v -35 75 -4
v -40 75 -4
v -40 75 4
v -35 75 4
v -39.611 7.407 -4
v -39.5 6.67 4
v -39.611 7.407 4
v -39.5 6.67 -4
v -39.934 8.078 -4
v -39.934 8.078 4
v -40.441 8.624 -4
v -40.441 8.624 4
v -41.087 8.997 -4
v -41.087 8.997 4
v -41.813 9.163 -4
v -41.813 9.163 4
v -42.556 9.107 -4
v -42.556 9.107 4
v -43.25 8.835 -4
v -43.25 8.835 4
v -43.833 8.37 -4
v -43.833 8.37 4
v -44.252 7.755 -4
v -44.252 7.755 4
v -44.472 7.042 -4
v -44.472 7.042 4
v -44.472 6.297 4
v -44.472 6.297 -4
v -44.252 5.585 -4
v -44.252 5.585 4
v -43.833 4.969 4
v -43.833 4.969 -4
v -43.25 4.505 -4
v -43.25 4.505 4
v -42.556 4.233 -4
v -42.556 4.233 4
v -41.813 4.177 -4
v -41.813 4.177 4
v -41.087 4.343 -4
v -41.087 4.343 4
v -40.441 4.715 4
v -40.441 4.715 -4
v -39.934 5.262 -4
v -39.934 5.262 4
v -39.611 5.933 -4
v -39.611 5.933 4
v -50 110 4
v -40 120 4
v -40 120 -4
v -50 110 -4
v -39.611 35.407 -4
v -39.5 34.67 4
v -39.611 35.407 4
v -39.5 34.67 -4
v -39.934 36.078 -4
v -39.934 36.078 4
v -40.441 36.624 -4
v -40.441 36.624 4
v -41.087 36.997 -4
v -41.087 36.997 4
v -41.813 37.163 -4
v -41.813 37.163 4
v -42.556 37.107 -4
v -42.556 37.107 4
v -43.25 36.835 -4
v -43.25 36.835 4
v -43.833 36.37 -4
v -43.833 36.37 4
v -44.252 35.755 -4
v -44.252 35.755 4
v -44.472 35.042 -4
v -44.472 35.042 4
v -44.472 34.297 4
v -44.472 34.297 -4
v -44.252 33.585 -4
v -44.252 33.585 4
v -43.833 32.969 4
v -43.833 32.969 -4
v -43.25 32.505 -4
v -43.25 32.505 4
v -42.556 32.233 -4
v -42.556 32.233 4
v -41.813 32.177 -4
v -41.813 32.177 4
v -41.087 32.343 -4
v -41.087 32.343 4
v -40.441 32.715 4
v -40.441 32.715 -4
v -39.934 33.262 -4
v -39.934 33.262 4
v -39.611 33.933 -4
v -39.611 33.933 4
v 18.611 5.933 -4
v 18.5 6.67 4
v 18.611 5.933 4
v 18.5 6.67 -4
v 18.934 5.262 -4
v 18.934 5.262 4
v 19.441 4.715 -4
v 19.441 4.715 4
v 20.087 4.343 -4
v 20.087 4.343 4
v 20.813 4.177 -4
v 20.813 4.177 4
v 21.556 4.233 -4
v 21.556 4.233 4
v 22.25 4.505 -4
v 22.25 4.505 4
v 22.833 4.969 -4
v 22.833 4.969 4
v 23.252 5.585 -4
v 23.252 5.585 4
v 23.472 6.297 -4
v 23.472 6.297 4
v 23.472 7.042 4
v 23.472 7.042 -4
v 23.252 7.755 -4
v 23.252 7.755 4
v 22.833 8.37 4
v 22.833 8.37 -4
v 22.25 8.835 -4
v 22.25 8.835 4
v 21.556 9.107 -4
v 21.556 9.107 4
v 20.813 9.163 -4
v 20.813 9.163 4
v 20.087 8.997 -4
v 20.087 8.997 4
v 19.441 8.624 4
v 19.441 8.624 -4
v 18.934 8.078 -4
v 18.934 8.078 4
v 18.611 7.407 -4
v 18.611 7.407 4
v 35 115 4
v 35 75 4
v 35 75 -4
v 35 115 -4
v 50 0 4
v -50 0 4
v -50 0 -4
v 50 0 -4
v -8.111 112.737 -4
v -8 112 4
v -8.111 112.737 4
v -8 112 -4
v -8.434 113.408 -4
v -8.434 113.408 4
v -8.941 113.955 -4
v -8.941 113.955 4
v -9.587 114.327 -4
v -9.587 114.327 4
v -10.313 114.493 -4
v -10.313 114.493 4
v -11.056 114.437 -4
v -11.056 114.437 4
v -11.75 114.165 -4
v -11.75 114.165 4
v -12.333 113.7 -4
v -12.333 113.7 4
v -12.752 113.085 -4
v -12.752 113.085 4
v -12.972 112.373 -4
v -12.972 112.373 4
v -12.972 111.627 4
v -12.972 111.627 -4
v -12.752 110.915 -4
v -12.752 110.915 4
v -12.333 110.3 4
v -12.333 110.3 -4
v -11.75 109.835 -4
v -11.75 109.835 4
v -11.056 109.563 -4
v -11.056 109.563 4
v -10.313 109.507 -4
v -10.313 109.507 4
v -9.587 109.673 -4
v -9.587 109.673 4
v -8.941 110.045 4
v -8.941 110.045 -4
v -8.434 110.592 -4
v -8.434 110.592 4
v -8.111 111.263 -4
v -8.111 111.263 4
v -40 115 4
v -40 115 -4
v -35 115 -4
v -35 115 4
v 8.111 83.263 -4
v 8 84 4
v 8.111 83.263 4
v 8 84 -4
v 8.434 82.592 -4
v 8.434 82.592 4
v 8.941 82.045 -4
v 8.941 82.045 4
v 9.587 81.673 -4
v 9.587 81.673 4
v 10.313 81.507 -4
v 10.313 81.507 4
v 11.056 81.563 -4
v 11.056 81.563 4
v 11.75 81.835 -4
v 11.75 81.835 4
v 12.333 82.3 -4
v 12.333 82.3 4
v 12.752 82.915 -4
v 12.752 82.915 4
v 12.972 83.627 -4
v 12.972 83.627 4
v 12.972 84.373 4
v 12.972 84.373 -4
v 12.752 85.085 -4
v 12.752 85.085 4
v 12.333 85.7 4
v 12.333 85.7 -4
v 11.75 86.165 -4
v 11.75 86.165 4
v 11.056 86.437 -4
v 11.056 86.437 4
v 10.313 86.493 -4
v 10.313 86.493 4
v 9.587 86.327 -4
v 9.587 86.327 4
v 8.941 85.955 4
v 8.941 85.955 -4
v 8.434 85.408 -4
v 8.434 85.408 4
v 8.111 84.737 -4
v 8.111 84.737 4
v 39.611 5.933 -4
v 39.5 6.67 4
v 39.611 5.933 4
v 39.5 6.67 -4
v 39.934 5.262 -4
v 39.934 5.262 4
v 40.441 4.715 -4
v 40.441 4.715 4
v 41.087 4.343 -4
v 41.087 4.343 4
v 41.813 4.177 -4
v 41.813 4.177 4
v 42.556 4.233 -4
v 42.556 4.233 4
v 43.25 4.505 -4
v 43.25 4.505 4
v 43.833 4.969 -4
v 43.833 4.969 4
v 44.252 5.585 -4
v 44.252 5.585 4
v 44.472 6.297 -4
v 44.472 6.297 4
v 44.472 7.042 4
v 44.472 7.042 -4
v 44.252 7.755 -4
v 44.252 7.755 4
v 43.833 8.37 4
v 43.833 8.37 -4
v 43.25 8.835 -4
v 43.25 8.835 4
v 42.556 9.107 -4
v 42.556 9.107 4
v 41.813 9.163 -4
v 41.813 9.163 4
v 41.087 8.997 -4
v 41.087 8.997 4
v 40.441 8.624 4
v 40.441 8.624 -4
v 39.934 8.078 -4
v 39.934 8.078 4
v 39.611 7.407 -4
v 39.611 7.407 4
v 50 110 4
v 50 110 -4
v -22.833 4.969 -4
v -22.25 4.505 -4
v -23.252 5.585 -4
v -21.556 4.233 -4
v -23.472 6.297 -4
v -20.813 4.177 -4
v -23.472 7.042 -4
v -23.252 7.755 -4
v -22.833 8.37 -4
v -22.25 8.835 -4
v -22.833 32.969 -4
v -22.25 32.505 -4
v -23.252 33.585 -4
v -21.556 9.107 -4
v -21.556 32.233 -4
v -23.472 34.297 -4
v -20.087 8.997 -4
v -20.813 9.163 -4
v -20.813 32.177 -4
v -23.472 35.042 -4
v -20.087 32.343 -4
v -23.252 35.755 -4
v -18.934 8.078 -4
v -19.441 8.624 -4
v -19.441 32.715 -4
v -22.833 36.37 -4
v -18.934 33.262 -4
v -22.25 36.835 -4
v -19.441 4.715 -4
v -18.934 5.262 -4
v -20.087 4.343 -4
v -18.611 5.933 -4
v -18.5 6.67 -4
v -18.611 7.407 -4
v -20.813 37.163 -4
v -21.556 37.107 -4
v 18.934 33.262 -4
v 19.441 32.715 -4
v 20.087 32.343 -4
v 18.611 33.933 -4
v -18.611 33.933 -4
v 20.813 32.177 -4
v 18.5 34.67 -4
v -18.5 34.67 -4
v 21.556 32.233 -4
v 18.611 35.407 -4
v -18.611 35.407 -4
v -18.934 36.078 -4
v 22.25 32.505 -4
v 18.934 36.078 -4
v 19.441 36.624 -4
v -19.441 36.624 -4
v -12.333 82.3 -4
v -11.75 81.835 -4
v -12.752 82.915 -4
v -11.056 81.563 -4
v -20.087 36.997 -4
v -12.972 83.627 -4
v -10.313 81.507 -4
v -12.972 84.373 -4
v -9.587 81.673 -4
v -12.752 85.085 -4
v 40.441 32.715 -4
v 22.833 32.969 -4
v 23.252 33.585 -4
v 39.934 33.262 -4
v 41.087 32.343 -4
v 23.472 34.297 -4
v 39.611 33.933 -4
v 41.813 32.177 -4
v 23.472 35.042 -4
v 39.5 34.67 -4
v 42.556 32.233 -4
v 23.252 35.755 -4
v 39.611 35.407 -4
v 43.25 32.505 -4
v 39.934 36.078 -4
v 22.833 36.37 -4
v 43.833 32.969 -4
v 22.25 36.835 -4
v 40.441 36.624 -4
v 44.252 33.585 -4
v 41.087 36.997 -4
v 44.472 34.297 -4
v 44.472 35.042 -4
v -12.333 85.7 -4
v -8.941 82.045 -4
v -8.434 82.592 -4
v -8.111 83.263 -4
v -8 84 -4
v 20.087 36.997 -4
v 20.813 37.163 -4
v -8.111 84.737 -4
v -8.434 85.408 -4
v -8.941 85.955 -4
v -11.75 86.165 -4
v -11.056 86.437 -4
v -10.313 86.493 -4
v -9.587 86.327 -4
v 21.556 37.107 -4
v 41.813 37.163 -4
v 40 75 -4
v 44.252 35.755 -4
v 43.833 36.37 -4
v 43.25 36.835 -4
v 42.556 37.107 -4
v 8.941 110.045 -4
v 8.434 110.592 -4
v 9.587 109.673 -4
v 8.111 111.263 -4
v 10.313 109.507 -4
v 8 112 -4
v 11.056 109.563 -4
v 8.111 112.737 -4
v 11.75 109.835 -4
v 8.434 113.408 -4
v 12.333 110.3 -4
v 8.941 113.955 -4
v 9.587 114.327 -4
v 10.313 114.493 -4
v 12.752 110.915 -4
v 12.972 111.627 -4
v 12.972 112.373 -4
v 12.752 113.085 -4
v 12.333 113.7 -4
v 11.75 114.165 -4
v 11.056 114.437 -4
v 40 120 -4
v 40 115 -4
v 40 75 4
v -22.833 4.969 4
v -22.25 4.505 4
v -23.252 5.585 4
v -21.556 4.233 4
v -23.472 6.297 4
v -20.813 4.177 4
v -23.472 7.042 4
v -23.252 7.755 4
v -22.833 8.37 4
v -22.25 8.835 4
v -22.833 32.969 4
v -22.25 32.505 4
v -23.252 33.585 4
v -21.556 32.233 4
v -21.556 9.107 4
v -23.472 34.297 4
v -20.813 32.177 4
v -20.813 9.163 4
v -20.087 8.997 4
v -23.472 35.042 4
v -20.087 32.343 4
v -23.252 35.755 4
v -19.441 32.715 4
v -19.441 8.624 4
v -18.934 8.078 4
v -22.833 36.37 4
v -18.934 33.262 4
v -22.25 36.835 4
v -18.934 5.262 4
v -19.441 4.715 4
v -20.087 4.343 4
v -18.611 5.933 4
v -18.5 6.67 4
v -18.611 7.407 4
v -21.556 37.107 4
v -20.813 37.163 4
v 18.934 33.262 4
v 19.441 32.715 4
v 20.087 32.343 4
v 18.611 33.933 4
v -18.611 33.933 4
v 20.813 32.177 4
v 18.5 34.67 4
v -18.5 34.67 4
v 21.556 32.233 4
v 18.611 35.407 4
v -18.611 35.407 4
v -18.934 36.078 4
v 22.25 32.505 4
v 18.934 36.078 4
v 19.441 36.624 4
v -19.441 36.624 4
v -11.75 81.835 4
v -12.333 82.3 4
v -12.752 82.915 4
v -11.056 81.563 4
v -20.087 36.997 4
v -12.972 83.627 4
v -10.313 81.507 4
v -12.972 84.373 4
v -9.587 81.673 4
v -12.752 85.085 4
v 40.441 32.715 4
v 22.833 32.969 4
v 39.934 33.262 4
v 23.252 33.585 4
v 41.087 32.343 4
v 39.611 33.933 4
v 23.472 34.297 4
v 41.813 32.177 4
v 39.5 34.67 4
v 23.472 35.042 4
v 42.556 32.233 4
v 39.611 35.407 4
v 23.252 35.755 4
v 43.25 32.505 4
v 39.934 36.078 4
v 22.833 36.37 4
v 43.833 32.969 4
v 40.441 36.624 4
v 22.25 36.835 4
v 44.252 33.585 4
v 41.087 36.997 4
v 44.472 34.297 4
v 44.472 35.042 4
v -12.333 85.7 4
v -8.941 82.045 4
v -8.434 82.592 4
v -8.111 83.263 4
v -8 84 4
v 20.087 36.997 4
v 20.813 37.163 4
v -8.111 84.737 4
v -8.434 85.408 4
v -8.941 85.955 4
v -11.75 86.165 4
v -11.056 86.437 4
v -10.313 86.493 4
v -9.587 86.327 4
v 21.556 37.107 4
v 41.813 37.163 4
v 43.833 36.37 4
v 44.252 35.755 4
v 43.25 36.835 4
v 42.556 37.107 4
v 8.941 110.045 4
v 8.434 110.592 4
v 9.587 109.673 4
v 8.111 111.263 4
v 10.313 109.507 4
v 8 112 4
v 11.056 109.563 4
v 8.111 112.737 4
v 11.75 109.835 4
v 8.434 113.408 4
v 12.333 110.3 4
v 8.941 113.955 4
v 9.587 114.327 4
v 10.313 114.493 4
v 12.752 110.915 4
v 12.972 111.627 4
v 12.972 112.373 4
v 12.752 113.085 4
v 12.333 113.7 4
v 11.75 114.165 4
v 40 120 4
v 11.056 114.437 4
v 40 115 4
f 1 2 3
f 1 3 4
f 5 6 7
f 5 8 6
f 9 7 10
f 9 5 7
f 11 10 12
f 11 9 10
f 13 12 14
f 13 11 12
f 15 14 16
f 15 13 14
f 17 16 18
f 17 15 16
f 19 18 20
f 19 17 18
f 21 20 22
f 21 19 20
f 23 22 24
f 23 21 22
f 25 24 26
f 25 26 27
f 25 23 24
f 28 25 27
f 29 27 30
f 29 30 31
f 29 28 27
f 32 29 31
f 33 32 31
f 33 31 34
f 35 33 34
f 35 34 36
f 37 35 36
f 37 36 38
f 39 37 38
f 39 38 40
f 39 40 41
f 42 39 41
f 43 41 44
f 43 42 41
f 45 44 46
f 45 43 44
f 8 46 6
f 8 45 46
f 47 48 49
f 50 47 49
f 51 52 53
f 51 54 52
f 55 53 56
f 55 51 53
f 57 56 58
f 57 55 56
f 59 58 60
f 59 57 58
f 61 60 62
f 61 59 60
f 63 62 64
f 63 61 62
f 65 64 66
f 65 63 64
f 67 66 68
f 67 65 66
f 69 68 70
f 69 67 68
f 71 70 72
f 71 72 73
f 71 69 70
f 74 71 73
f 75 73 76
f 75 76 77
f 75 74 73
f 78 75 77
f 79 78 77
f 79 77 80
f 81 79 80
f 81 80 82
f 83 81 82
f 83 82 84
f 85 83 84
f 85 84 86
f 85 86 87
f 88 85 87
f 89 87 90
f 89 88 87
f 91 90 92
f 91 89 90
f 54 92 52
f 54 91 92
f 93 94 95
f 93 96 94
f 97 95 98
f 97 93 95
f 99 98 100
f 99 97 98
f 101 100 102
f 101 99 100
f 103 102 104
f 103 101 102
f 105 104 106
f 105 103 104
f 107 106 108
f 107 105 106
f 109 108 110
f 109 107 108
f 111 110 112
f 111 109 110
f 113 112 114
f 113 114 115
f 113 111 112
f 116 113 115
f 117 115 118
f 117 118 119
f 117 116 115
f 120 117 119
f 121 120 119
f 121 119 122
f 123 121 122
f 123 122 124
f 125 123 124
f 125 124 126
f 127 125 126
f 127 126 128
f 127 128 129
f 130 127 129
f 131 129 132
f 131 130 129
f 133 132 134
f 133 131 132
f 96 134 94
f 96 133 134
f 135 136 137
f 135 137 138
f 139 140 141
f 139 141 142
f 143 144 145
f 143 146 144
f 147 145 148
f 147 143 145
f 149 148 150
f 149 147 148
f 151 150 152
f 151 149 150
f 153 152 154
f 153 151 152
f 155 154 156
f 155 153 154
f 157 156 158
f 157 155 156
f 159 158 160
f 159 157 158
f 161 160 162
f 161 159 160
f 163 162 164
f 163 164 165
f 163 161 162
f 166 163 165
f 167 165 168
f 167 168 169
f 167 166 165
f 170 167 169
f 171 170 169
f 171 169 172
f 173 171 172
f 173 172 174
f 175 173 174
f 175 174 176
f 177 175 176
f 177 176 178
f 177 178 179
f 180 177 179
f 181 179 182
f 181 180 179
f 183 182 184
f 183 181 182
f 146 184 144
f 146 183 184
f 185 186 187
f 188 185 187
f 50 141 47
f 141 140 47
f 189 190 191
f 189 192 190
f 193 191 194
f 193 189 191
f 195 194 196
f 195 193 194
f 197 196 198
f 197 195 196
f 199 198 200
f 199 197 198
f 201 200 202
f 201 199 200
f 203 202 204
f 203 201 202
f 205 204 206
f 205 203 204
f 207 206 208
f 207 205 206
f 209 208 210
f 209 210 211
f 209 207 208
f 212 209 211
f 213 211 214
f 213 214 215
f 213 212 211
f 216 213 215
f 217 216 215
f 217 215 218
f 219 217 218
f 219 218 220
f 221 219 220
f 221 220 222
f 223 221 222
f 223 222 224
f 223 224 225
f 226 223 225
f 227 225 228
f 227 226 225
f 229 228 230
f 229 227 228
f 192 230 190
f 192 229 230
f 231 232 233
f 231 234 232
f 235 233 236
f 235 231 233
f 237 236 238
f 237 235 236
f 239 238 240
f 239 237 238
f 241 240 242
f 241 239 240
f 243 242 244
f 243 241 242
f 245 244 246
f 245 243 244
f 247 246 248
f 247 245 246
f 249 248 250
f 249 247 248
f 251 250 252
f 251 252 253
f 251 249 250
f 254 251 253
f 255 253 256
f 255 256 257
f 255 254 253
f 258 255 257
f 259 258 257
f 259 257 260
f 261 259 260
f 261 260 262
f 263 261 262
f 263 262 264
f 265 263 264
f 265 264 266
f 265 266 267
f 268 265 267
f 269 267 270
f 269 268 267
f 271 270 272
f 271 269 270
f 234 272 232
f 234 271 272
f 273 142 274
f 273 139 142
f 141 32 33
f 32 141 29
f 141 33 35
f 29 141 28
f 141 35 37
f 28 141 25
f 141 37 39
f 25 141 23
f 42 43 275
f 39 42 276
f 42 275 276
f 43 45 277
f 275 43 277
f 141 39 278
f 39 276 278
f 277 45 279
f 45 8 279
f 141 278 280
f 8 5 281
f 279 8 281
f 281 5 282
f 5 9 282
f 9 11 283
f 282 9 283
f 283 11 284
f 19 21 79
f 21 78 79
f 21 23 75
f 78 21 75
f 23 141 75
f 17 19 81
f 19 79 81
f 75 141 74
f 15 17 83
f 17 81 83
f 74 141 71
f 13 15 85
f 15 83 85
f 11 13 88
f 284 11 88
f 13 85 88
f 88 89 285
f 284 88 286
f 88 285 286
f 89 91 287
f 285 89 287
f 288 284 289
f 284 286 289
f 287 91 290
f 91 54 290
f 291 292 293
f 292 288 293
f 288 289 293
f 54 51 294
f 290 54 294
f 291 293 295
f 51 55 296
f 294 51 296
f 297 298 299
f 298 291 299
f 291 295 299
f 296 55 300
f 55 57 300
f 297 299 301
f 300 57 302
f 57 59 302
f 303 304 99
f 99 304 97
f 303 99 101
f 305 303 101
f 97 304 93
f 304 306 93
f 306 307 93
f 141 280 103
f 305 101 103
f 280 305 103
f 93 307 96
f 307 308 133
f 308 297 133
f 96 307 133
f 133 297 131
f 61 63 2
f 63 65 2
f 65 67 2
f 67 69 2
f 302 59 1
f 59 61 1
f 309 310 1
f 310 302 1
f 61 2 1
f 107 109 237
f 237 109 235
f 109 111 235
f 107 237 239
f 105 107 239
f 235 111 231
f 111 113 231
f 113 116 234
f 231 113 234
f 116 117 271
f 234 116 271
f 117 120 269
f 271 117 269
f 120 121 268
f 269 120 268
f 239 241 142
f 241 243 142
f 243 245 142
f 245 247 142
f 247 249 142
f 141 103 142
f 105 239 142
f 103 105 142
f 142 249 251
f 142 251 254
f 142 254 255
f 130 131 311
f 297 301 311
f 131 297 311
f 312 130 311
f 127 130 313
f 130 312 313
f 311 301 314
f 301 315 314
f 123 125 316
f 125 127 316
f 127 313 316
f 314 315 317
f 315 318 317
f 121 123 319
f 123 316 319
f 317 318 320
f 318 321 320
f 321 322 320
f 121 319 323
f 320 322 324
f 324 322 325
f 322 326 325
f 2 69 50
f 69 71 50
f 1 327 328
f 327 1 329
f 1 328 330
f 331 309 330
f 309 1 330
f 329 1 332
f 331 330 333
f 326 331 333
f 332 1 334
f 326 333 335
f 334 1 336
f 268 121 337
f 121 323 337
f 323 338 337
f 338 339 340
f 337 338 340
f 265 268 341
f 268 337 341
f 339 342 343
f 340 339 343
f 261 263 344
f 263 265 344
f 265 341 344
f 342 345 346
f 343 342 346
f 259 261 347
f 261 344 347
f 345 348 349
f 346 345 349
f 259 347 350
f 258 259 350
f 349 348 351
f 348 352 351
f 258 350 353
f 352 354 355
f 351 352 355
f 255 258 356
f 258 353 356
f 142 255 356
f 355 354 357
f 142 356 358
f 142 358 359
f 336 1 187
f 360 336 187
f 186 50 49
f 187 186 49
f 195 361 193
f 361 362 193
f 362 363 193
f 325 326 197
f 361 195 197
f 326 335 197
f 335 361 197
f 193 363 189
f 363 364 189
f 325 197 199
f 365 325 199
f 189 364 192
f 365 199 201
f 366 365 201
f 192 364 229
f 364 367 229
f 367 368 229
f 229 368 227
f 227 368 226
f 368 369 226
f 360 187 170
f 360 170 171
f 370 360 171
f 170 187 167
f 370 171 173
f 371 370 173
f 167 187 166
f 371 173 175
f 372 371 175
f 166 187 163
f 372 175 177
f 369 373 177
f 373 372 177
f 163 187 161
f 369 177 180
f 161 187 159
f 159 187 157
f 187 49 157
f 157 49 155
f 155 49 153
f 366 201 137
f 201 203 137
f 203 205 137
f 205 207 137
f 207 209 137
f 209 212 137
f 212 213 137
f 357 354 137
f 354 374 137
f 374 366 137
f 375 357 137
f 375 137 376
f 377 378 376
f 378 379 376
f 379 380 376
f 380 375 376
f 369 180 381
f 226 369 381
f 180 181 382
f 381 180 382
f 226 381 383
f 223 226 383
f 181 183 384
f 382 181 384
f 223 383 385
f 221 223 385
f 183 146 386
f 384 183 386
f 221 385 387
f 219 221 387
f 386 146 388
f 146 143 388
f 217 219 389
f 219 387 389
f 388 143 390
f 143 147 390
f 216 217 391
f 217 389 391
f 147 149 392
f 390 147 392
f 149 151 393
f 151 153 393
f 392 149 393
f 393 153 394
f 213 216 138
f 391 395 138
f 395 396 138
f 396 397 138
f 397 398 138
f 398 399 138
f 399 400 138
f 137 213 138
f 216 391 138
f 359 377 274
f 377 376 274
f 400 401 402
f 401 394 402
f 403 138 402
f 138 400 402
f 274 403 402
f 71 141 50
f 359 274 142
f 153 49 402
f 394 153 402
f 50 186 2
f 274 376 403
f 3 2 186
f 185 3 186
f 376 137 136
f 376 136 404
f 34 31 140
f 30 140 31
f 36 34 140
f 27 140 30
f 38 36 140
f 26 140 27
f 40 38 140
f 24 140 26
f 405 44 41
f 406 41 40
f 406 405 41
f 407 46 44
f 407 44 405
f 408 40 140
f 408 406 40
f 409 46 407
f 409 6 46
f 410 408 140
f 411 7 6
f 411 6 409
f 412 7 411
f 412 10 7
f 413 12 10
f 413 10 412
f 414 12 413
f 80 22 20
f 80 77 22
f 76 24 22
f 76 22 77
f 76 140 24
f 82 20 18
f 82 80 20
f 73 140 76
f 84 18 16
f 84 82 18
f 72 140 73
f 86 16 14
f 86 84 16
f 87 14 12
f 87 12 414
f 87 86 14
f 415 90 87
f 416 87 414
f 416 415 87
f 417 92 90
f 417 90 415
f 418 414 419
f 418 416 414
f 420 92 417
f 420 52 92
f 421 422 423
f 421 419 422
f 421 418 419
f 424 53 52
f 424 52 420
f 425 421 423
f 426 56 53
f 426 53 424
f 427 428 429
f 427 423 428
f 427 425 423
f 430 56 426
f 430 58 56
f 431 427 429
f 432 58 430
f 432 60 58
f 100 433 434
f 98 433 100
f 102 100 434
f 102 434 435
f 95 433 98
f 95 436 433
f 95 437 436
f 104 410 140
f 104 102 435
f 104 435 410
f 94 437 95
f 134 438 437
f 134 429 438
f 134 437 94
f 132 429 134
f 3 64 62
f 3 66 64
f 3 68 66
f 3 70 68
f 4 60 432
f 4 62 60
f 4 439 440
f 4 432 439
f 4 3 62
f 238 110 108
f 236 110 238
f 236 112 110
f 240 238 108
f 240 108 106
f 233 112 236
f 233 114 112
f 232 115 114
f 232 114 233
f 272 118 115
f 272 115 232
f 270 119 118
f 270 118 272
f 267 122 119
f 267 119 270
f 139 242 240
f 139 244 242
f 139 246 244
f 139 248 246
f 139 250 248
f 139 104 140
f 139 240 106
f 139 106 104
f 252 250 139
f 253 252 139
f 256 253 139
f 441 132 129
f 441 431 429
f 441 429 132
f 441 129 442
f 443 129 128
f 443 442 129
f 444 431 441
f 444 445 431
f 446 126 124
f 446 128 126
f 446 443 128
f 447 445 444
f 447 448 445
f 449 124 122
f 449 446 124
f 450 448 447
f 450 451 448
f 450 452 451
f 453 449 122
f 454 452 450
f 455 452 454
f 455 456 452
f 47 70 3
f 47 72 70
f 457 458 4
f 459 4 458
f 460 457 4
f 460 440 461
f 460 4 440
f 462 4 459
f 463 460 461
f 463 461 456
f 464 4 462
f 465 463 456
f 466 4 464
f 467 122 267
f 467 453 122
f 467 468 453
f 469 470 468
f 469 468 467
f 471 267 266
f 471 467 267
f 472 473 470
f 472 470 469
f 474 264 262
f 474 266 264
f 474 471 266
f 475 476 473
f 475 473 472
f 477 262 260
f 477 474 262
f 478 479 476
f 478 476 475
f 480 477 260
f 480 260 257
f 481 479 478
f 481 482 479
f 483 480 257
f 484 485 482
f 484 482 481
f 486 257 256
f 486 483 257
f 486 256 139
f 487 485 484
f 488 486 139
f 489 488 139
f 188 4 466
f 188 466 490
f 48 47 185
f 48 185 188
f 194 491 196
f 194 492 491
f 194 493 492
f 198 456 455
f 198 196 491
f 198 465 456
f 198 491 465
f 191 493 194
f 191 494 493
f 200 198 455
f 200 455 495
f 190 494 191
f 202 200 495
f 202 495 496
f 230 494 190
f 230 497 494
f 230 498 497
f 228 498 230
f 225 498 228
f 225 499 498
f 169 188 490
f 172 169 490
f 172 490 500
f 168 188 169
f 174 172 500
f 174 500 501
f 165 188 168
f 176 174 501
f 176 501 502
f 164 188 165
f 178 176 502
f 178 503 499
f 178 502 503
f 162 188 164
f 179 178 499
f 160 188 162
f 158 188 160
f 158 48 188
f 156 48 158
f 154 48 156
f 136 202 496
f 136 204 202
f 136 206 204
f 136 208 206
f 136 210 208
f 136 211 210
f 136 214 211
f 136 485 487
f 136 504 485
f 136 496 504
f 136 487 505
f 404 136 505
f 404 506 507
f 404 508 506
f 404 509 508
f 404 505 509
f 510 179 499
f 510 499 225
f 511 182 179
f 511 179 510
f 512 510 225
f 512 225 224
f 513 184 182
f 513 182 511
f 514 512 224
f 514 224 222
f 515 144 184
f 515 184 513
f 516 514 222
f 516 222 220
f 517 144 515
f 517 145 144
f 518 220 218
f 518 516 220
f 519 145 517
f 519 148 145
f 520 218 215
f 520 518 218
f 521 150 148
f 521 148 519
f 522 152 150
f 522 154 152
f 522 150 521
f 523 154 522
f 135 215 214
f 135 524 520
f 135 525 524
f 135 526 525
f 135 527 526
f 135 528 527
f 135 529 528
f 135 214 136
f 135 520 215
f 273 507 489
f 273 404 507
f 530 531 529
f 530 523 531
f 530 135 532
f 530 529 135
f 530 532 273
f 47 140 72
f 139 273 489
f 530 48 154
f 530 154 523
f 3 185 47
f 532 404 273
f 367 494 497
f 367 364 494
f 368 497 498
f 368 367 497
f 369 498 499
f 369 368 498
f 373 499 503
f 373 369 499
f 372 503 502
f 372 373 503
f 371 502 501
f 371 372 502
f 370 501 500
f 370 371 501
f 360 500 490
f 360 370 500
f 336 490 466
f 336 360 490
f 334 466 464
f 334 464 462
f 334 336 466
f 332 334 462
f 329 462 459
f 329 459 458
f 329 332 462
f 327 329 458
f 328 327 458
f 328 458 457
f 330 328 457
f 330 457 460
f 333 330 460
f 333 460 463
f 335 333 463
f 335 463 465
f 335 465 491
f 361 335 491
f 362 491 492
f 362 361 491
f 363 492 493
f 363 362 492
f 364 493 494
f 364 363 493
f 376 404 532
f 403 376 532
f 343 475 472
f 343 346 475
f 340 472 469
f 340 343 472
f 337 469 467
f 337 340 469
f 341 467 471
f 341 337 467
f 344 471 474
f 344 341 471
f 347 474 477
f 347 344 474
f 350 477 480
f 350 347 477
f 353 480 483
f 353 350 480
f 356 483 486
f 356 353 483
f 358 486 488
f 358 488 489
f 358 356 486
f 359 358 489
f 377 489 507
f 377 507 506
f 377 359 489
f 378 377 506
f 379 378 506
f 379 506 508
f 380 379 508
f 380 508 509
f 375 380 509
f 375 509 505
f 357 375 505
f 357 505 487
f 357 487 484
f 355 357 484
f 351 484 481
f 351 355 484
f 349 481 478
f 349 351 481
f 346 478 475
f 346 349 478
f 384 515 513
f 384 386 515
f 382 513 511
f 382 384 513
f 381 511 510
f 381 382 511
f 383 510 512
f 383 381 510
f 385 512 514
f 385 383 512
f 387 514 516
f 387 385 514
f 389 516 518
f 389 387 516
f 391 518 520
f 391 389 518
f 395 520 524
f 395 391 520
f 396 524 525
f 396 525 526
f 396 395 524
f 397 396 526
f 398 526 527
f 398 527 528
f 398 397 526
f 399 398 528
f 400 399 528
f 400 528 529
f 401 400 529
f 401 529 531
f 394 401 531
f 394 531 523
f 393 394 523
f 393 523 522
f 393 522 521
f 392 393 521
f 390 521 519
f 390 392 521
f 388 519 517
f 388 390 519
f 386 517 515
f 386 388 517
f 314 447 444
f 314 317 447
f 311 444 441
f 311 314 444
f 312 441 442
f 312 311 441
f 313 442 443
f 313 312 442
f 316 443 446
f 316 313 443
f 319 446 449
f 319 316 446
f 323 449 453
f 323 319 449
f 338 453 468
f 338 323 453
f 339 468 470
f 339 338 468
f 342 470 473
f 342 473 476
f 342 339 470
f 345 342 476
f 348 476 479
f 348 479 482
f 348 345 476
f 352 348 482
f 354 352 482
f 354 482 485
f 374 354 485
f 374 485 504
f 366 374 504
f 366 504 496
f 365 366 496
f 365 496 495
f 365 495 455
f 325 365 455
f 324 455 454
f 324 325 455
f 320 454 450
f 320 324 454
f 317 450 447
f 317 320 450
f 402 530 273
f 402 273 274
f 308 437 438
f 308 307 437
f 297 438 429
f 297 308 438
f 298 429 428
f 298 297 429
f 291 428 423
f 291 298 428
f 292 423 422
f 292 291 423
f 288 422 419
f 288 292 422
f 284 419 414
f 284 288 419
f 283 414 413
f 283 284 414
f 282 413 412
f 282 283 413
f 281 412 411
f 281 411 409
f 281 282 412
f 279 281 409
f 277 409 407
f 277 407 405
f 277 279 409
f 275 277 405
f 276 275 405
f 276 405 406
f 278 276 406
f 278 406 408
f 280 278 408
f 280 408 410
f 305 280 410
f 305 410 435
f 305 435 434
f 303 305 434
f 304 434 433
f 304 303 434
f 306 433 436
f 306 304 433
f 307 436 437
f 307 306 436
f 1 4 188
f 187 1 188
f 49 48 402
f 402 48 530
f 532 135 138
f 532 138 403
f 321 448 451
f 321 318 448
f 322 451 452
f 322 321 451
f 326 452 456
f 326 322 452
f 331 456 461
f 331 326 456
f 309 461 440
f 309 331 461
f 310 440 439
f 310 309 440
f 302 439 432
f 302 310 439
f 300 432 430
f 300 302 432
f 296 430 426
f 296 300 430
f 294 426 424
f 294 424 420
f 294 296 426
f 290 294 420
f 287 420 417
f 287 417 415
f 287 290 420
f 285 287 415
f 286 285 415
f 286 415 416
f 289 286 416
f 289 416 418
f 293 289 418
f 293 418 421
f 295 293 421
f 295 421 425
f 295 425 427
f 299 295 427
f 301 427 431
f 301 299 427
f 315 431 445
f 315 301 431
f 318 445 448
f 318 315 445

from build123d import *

# Parameters (mm, degrees)
SKETCH1_W           = 100
SKETCH1_H           = 120
SKETCH1_R           = 2.5
SKETCH1_W_2         = 5
SKETCH1_H_2         = 40
BOSS_EXTRUDE1_DEPTH = 4
CHAMFER1_SIZE       = 10


with BuildPart() as part:
    # Sketch1 → Boss-Extrude1 (new, symmetric)
    with BuildSketch(Plane.XY):
        with Locations((0, 60)):
            Rectangle(SKETCH1_W, SKETCH1_H)
        with Locations((-42, 6.66986634)):
            Circle(SKETCH1_R, mode=Mode.SUBTRACT)
        with Locations((-42, 34.66986634)):
            Circle(SKETCH1_R, mode=Mode.SUBTRACT)
        with Locations((-10.5, 112)):
            Circle(SKETCH1_R, mode=Mode.SUBTRACT)
        with Locations((-10.5, 84)):
            Circle(SKETCH1_R, mode=Mode.SUBTRACT)
        with Locations((10.5, 84)):
            Circle(SKETCH1_R, mode=Mode.SUBTRACT)
        with Locations((10.5, 112)):
            Circle(SKETCH1_R, mode=Mode.SUBTRACT)
        with Locations((-21, 6.66986634)):
            Circle(SKETCH1_R, mode=Mode.SUBTRACT)
        with Locations((-21, 34.66986634)):
            Circle(SKETCH1_R, mode=Mode.SUBTRACT)
        with Locations((21, 34.66986634)):
            Circle(SKETCH1_R, mode=Mode.SUBTRACT)
        with Locations((21, 6.66986634)):
            Circle(SKETCH1_R, mode=Mode.SUBTRACT)
        with Locations((42, 34.66986634)):
            Circle(SKETCH1_R, mode=Mode.SUBTRACT)
        with Locations((42, 6.66986634)):
            Circle(SKETCH1_R, mode=Mode.SUBTRACT)
        with Locations((37.5, 95)):
            Rectangle(SKETCH1_W_2, SKETCH1_H_2, mode=Mode.SUBTRACT)
        with Locations((-37.5, 95)):
            Rectangle(SKETCH1_W_2, SKETCH1_H_2, mode=Mode.SUBTRACT)
    extrude(amount=BOSS_EXTRUDE1_DEPTH, both=True)

    # Chamfer1
    chamfer1_edges = [part.edges().sort_by_distance(p)[0] for p in [
        (50, 120, 0),
        (-50, 120, 0),
    ]]
    chamfer(chamfer1_edges, length=CHAMFER1_SIZE)


solid = part.part
